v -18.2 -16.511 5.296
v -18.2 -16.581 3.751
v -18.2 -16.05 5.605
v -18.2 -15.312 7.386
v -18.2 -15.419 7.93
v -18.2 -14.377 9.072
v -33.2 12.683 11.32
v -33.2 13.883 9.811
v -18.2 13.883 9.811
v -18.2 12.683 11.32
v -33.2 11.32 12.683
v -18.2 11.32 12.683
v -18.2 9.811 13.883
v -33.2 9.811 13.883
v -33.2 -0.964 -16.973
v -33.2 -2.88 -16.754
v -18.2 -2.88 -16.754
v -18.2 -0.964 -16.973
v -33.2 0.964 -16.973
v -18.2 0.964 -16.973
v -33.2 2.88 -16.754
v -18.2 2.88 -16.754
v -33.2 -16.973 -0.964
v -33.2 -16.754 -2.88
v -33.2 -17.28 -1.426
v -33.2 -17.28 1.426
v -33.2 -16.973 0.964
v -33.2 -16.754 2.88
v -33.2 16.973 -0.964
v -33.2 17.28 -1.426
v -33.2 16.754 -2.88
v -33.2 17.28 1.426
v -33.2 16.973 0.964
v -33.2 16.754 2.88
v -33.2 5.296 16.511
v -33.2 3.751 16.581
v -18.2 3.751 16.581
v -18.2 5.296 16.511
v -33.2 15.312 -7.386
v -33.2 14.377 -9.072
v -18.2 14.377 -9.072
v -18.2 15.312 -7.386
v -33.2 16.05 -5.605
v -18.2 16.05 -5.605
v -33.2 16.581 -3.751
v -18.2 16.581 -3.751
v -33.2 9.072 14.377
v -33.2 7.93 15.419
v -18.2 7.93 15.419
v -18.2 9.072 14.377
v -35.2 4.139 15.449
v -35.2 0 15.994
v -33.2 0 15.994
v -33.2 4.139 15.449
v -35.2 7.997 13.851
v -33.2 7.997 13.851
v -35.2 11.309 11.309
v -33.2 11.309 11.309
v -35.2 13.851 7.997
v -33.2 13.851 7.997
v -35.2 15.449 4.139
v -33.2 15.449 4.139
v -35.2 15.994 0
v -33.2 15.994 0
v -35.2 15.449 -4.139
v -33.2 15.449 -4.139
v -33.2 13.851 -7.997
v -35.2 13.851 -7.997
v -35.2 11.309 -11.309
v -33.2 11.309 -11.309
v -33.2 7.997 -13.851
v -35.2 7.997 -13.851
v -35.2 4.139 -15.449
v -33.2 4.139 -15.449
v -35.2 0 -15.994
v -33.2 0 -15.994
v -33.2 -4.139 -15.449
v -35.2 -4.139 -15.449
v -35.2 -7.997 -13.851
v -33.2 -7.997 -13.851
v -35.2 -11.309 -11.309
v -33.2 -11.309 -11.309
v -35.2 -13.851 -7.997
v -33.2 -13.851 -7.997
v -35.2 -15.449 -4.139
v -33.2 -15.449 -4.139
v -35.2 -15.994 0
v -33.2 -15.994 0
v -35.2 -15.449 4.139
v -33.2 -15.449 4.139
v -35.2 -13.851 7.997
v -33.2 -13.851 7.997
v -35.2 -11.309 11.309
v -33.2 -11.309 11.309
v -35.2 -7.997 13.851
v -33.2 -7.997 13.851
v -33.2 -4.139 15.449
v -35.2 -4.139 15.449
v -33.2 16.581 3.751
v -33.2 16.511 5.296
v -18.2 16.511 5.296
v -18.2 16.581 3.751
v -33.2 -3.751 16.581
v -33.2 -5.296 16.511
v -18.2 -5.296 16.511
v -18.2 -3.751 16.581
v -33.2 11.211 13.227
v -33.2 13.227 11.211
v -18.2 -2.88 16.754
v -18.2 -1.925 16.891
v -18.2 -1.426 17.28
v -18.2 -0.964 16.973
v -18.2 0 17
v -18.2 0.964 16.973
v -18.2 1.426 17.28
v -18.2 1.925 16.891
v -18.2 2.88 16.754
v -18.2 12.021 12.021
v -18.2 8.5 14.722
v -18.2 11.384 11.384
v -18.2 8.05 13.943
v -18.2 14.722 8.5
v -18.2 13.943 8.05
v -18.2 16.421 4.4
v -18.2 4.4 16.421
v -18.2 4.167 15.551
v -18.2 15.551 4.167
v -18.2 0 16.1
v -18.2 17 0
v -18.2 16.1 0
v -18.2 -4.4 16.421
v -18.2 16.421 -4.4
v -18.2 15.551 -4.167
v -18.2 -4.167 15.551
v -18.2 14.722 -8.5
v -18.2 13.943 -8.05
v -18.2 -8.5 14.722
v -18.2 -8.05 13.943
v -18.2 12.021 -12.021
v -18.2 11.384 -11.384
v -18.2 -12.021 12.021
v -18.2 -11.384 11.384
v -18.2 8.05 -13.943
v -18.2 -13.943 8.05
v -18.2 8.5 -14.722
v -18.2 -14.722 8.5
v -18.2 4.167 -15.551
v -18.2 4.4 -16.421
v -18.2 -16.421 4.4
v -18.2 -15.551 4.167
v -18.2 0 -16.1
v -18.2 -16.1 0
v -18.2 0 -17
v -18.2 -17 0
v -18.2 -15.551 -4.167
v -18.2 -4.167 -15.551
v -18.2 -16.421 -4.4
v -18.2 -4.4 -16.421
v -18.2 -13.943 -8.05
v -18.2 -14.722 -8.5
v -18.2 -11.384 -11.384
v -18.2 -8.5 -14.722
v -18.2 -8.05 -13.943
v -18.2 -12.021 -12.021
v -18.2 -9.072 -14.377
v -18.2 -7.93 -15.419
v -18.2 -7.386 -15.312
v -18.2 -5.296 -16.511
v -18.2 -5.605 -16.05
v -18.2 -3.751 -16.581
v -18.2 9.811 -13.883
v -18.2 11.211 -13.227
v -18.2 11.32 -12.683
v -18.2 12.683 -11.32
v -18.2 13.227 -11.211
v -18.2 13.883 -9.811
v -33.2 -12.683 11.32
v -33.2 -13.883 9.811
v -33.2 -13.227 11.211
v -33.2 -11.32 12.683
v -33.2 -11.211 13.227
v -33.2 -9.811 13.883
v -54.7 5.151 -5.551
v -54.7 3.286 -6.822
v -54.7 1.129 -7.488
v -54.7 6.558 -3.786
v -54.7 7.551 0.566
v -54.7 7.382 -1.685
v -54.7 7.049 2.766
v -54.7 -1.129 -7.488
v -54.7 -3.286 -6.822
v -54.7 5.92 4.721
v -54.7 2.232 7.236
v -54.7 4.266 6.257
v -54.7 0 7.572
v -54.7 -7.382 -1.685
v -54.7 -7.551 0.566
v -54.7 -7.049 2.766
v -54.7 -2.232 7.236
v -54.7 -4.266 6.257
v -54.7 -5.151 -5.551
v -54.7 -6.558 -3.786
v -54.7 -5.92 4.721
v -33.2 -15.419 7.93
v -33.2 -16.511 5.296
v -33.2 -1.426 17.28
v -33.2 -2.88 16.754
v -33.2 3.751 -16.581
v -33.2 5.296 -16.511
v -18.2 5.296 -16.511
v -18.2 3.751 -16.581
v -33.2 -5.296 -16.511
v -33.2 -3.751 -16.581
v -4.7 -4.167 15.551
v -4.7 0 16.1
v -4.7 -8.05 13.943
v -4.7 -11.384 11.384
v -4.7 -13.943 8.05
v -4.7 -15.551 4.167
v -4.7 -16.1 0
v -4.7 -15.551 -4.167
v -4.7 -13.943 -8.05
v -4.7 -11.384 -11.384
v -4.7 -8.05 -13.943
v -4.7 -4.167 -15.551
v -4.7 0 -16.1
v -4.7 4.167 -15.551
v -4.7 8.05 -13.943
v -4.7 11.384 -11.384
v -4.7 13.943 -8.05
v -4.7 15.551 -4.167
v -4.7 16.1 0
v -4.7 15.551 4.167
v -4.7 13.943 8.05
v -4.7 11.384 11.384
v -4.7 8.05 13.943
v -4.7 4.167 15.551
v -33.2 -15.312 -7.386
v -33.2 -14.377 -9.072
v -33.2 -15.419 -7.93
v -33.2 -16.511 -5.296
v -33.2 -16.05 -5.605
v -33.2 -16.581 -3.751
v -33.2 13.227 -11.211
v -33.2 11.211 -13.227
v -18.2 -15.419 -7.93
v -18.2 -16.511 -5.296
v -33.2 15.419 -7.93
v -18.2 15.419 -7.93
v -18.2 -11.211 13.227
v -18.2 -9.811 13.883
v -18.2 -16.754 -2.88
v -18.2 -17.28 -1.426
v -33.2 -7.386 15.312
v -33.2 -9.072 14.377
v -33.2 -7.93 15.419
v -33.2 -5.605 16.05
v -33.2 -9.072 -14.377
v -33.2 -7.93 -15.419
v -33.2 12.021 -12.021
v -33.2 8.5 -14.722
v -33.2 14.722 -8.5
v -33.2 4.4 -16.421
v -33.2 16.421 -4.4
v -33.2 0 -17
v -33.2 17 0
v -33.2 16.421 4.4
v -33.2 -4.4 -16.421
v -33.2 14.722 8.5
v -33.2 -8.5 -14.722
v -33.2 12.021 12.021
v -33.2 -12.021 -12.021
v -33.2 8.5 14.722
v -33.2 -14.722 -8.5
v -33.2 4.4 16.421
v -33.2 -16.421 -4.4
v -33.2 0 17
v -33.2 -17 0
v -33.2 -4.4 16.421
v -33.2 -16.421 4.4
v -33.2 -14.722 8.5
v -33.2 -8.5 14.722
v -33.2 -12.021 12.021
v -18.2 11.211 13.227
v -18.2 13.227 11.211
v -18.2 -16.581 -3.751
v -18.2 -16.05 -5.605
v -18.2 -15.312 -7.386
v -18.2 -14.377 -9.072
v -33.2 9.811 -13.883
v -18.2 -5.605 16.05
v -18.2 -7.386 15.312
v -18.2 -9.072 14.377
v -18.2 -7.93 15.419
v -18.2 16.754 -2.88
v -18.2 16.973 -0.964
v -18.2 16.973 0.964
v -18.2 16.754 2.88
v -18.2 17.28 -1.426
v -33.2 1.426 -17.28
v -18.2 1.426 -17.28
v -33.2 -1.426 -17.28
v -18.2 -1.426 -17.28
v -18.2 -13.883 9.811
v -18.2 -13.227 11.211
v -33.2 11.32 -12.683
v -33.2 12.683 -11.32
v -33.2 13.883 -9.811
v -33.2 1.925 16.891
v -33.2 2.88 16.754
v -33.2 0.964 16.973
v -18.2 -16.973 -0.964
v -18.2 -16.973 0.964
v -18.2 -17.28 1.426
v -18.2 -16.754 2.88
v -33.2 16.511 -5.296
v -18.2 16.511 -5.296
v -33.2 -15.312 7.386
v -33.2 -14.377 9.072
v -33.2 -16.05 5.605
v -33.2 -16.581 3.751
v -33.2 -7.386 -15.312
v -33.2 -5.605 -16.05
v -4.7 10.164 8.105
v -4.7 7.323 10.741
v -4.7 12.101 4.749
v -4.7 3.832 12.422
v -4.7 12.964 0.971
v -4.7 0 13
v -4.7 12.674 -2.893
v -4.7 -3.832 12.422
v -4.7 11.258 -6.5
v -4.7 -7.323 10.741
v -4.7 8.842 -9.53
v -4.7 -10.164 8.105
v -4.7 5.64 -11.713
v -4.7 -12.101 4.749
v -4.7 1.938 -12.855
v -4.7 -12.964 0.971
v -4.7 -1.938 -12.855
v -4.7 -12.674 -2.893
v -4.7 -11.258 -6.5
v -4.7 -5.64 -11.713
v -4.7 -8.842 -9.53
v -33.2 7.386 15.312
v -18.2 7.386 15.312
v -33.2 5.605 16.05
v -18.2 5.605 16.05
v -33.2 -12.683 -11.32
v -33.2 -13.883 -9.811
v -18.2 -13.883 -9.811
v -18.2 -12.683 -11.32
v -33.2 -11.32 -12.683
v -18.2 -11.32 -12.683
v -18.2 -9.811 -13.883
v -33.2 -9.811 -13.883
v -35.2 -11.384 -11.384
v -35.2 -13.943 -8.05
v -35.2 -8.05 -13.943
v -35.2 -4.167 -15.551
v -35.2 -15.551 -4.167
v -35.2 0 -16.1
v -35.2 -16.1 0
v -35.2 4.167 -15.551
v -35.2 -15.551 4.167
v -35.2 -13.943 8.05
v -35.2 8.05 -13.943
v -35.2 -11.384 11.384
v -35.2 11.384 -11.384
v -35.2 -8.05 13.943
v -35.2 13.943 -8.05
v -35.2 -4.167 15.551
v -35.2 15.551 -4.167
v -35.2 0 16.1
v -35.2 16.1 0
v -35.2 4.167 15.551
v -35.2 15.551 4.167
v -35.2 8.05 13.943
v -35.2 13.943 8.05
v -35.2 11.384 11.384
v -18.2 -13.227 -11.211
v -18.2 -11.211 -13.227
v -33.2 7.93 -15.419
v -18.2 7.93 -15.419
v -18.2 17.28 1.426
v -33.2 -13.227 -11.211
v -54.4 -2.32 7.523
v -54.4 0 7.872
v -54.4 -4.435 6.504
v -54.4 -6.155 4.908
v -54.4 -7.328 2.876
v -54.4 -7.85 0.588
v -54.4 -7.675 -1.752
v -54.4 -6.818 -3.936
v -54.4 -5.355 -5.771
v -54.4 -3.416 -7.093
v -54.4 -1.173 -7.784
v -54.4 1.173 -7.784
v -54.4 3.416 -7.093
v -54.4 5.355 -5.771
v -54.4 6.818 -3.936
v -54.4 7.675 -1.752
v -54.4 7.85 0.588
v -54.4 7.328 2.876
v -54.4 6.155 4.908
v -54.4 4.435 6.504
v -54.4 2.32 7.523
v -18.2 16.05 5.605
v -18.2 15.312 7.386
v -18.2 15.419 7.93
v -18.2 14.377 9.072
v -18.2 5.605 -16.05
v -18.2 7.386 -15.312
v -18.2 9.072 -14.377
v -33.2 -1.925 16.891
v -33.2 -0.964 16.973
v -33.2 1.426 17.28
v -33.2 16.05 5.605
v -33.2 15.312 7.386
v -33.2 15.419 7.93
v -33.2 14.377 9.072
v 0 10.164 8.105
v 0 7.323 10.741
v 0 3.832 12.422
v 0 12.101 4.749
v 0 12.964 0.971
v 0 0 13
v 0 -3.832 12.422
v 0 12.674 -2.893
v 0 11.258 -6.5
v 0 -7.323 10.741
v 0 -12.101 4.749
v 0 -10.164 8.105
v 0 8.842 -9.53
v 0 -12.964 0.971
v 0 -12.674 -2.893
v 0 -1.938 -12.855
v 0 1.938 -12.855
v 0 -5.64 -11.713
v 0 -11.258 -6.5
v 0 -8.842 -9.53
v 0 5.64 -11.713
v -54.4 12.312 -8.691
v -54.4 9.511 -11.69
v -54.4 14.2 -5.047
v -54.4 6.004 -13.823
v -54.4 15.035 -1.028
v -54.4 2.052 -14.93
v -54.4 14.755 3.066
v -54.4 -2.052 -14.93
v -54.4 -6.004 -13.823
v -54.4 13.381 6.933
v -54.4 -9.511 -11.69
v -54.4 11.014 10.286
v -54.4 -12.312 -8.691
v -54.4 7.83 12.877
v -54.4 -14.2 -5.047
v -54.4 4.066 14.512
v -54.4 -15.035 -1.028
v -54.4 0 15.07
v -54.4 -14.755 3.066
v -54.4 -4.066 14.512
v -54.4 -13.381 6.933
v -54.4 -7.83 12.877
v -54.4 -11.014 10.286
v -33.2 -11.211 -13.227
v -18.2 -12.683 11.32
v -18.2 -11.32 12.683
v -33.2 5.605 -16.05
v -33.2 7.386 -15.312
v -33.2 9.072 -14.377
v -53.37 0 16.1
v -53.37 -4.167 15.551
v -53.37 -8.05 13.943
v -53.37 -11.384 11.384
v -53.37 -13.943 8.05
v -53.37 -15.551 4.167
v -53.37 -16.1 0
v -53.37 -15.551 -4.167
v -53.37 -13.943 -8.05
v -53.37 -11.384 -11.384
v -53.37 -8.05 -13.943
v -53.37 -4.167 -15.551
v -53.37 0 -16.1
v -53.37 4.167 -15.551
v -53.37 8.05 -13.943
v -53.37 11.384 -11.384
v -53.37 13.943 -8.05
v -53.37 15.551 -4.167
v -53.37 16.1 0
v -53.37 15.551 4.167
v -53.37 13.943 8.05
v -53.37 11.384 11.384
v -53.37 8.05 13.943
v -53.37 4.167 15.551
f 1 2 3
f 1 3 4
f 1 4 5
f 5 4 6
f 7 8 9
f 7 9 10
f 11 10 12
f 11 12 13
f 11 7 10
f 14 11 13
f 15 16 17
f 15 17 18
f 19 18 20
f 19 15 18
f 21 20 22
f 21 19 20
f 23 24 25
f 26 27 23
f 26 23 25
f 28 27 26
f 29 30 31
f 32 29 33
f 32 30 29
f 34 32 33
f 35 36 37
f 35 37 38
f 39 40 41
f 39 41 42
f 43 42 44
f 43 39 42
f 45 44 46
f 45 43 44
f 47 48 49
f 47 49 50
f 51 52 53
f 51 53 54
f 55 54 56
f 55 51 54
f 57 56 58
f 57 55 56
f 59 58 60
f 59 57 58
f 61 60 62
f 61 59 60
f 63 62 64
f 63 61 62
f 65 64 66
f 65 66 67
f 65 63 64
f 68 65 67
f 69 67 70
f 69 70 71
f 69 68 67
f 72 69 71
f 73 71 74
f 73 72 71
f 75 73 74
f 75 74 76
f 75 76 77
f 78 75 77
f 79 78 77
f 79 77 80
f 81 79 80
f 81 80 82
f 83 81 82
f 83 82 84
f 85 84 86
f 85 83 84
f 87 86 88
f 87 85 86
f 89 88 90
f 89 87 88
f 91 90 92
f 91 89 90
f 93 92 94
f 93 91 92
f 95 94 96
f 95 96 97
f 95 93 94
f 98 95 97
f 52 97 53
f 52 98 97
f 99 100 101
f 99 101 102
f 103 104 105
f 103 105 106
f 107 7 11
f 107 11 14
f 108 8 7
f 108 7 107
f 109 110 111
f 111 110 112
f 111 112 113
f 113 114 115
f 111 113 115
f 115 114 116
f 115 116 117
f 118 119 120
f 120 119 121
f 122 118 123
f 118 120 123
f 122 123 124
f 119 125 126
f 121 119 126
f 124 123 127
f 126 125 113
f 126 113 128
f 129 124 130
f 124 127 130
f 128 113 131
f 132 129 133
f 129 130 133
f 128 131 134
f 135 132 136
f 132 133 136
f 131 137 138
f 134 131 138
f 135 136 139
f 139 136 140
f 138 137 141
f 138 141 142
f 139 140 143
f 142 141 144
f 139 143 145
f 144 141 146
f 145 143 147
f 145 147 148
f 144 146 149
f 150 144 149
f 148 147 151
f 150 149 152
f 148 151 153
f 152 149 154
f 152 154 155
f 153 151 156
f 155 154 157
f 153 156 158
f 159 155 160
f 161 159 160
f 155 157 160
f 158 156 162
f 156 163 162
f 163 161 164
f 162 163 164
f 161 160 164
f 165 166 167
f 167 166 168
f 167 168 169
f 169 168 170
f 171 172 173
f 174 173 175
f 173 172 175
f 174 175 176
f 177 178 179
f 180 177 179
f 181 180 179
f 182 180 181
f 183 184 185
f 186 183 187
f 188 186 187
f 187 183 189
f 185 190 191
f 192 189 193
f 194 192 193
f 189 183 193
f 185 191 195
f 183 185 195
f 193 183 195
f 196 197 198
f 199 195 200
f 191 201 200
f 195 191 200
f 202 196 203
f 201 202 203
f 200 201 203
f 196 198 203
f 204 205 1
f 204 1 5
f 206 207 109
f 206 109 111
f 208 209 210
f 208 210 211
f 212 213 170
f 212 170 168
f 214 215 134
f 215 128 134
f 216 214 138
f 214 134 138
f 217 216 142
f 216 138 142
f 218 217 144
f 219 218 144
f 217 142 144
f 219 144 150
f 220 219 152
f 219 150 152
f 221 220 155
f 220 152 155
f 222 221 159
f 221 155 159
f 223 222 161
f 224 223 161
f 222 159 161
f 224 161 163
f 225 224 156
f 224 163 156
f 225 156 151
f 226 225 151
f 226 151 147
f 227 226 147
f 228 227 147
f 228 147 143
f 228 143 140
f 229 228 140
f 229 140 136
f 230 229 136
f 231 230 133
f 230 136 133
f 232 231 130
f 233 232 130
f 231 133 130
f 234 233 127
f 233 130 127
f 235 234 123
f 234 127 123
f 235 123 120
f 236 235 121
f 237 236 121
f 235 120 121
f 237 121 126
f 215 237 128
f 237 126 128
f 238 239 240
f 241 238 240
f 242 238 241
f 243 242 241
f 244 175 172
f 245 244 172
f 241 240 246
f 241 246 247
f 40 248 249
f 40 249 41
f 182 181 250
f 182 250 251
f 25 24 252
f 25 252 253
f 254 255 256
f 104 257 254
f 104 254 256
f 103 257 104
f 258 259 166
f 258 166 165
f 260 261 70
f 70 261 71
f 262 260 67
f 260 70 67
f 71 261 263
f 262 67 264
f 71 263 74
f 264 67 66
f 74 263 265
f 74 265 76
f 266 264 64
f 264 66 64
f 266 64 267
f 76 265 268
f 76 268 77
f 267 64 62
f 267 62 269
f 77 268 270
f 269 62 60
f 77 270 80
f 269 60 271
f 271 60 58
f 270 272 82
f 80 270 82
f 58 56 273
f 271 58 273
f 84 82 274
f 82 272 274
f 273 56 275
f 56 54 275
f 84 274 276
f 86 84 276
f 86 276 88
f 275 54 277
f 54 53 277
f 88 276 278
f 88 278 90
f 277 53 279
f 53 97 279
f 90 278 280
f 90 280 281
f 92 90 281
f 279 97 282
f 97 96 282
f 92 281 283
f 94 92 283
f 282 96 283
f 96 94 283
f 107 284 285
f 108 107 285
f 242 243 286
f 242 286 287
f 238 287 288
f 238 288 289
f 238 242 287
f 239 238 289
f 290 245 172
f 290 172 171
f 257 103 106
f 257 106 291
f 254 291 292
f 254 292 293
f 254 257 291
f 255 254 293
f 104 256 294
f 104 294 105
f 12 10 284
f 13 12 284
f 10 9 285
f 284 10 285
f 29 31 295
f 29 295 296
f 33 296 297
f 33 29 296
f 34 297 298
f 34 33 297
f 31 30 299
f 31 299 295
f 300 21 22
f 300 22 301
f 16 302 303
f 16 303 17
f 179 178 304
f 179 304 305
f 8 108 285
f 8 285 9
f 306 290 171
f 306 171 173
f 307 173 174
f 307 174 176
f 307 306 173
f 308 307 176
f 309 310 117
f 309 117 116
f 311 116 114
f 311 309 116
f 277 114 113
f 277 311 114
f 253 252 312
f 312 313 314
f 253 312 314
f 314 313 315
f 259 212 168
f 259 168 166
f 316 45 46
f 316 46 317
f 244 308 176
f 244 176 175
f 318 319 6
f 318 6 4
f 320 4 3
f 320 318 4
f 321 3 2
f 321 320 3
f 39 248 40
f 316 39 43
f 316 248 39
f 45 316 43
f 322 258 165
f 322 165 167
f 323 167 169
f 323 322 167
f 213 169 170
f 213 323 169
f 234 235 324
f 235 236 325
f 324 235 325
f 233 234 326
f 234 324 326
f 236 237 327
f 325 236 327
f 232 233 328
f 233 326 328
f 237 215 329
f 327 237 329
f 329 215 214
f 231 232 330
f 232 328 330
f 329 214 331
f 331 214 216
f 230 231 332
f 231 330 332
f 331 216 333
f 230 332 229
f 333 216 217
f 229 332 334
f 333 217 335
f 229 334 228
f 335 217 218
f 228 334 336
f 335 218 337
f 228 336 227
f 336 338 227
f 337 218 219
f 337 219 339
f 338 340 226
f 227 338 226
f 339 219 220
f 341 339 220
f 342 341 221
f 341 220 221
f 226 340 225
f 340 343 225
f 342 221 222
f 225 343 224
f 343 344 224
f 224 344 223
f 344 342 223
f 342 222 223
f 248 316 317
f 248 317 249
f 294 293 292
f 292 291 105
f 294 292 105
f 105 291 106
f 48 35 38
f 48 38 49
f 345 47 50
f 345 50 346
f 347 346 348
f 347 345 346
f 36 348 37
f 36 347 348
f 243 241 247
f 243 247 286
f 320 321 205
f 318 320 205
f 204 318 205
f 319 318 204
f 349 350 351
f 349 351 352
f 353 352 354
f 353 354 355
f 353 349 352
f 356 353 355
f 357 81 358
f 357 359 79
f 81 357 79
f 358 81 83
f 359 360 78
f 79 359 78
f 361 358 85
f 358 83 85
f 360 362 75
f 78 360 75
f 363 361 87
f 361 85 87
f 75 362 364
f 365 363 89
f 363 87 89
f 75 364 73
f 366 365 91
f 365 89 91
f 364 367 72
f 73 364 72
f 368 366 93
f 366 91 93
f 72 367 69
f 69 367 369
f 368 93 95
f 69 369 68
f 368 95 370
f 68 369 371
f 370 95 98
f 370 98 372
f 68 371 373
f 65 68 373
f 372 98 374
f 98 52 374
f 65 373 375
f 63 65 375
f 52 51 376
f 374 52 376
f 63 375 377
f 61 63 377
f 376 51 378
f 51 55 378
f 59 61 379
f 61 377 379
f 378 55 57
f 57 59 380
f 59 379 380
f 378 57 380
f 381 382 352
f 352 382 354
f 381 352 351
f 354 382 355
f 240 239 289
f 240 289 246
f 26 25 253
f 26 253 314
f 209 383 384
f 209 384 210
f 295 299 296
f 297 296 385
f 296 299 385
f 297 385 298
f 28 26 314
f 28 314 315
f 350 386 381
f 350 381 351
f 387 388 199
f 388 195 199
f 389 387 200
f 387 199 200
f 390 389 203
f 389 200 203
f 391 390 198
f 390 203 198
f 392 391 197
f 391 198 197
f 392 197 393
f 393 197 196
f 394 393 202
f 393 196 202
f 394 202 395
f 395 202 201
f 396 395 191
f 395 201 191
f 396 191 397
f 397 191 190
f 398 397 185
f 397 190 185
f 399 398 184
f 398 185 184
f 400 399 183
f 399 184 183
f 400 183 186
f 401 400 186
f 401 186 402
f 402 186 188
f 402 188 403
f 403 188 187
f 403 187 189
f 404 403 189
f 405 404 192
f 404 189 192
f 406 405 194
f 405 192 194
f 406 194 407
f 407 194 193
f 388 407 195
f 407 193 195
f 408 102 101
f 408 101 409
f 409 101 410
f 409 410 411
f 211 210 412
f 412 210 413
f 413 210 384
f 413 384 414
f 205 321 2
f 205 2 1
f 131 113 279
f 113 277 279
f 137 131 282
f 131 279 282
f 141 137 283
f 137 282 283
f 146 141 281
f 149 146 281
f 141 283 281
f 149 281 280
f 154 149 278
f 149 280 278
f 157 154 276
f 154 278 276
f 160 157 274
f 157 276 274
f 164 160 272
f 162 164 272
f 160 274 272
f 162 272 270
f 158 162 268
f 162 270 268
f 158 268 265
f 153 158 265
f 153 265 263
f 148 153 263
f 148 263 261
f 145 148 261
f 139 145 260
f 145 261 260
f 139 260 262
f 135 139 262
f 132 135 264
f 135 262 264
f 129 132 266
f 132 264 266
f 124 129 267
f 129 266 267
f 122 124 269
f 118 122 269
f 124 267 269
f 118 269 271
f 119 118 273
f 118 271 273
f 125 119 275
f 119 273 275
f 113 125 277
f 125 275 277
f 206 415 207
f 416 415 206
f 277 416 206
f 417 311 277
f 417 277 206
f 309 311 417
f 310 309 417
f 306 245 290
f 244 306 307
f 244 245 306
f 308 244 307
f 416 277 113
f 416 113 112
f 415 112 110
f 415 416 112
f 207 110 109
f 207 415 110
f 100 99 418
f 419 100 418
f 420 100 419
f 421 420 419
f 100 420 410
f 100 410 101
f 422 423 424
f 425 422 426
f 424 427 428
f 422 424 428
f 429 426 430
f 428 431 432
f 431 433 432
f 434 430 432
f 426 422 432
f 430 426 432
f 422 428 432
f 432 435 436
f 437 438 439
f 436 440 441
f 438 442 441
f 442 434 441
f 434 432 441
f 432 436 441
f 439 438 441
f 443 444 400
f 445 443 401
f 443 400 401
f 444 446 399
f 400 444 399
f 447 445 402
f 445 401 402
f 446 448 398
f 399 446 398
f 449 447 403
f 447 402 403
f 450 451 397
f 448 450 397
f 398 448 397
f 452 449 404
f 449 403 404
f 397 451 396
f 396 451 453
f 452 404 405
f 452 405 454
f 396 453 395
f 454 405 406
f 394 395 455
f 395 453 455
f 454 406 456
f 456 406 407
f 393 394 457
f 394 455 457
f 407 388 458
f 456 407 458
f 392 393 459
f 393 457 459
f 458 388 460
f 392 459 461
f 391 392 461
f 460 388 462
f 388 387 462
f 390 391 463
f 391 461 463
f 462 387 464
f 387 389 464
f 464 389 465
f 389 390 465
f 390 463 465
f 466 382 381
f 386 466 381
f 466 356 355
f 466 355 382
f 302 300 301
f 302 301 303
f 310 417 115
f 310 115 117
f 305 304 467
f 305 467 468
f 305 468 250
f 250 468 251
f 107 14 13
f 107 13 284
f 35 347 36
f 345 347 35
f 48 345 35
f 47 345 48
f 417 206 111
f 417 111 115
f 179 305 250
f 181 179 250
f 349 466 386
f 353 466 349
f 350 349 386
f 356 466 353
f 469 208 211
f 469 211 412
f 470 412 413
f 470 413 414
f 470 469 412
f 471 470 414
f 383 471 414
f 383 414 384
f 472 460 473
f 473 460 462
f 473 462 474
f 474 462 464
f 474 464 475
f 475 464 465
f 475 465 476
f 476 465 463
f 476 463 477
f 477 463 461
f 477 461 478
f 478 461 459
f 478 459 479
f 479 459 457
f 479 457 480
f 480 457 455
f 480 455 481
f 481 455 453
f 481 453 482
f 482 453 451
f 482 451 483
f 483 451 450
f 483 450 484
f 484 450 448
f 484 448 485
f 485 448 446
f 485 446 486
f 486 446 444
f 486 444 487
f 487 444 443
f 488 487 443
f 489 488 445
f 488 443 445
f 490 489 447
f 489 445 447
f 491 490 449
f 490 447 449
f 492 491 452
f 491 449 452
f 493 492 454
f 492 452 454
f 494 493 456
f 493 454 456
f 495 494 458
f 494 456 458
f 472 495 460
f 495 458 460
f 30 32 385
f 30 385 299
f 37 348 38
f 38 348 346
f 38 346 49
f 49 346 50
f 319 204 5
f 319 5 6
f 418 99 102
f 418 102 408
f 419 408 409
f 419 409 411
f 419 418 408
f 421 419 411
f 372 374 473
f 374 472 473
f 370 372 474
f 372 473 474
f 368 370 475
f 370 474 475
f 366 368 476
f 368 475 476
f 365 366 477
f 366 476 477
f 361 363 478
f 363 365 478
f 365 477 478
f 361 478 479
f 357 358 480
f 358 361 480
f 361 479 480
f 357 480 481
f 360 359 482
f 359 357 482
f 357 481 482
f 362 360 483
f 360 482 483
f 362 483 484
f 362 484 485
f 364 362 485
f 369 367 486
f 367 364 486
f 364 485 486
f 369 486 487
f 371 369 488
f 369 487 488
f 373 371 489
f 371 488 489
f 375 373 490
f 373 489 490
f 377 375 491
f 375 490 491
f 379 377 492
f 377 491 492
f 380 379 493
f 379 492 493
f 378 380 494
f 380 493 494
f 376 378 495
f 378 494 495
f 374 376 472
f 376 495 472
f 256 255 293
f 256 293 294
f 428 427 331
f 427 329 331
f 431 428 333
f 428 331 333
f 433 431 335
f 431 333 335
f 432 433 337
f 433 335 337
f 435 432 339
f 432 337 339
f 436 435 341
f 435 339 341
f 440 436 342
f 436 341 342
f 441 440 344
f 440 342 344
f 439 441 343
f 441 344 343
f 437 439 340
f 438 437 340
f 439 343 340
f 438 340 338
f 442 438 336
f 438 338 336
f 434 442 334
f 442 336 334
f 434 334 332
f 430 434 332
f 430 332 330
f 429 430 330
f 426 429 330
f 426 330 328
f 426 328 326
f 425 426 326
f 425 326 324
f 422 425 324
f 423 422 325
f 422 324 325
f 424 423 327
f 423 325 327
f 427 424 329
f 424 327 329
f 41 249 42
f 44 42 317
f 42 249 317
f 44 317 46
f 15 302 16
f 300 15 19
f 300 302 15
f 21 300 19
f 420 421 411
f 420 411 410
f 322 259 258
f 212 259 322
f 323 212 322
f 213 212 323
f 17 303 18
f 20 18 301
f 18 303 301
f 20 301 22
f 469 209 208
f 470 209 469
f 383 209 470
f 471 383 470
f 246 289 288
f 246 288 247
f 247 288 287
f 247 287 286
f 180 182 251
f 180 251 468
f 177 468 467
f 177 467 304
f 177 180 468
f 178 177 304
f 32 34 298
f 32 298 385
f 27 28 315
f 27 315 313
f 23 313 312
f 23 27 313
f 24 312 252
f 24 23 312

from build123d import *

# Parameters (mm, degrees)
BOSS_EXTRUDE1_DEPTH    = 15
BOSS_EXTRUDE1_2_DEPTH  = 15
BOSS_EXTRUDE1_3_DEPTH  = 15
BOSS_EXTRUDE1_4_DEPTH  = 15
BOSS_EXTRUDE1_5_DEPTH  = 15
BOSS_EXTRUDE1_6_DEPTH  = 15
BOSS_EXTRUDE1_7_DEPTH  = 15
BOSS_EXTRUDE1_8_DEPTH  = 15
BOSS_EXTRUDE1_9_DEPTH  = 15
BOSS_EXTRUDE1_10_DEPTH = 15
BOSS_EXTRUDE1_11_DEPTH = 15
BOSS_EXTRUDE1_12_DEPTH = 15
BOSS_EXTRUDE1_13_DEPTH = 15
BOSS_EXTRUDE1_14_DEPTH = 15
BOSS_EXTRUDE1_15_DEPTH = 15
BOSS_EXTRUDE1_16_DEPTH = 15
CUT_EXTRUDE1_START     = 2
SKETCH3_R              = 16.1
SKETCH3_R_2            = 15.993618491
CUT_EXTRUDE1_DEPTH     = 2


with BuildPart() as part:
    # Sketch1 → Revolve1 (revolve)
    with BuildSketch(Plane.XY, mode=Mode.PRIVATE) as revolve1_sk:
        Polygon((0, 0), (0, 13), (-4.7, 13), (-4.7, 16.1), (-18.2, 16.1), (-18.2, 17), (-33.2, 17), (-33.2, 16.1), (-53.370470841, 16.1), (-54.399998096, 15.070472746), (-54.399998096, 7.872343539), (-54.7, 7.572341635), (-54.7, 0), align=None)
    revolve(revolve1_sk.sketch.rotate(Axis((-54.7, 0, 0), (1, 0, 0)), 90), axis=Axis((-54.7, 0, 0), (1, 0, 0)))

    # Sketch3 → Cut-Extrude1 (cut)
    with BuildSketch(Plane.ZY.offset(33.2).offset(CUT_EXTRUDE1_START)):
        Circle(SKETCH3_R)
        Circle(SKETCH3_R_2, mode=Mode.SUBTRACT)
    extrude(amount=-CUT_EXTRUDE1_DEPTH, mode=Mode.SUBTRACT)


with BuildPart() as body_2:
    # Sketch2 → Boss-Extrude1 (new body)
    with BuildSketch(Plane.ZY.offset(33.2)):
        with BuildLine():
            Line((17.280365855, 1.425744986), (16.754324522, 2.879689187))
            ThreePointArc((16.754324522, 2.879689187), (16.938469778, 1.445074933), (17, 0))
            ThreePointArc((17, 0), (16.938469778, -1.445074933), (16.754324522, -2.879689187))
            Line((16.754324522, -2.879689187), (17.280365855, -1.425744986))
            Line((17.280365855, -1.425744986), (17.280365855, 1.425744986))
        make_face()
    extrude(amount=-BOSS_EXTRUDE1_DEPTH)


with BuildPart() as body_3:
    # Sketch2 → Boss-Extrude1 2 (new body)
    with BuildSketch(Plane.ZY.offset(33.2)):
        with BuildLine():
            Line((16.510585312, -5.295693106), (16.580986849, -3.751116515))
            ThreePointArc((16.580986849, -3.751116515), (15.705952053, -6.50561835), (14.376968165, -9.072088315))
            Line((14.376968165, -9.072088315), (15.419367342, -7.930126329))
            Line((15.419367342, -7.930126329), (16.510585312, -5.295693106))
        make_face()
    extrude(amount=-BOSS_EXTRUDE1_2_DEPTH)


with BuildPart() as body_4:
    # Sketch2 → Boss-Extrude1 3 (new body)
    with BuildSketch(Plane.ZY.offset(33.2)):
        with BuildLine():
            Line((13.227217825, -11.210909929), (13.883344235, -9.810848732))
            ThreePointArc((13.883344235, -9.810848732), (12.02081528, -12.02081528), (9.810848732, -13.883344235))
            Line((9.810848732, -13.883344235), (11.210909929, -13.227217825))
            Line((11.210909929, -13.227217825), (13.227217825, -11.210909929))
        make_face()
    extrude(amount=-BOSS_EXTRUDE1_3_DEPTH)


with BuildPart() as body_5:
    # Sketch2 → Boss-Extrude1 4 (new body)
    with BuildSketch(Plane.ZY.offset(33.2)):
        with BuildLine():
            Line((7.930126329, -15.419367342), (9.072088315, -14.376968165))
            ThreePointArc((9.072088315, -14.376968165), (6.50561835, -15.705952053), (3.751116515, -16.580986849))
            Line((3.751116515, -16.580986849), (5.295693106, -16.510585312))
            Line((5.295693106, -16.510585312), (7.930126329, -15.419367342))
        make_face()
    extrude(amount=-BOSS_EXTRUDE1_4_DEPTH)


with BuildPart() as body_6:
    # Sketch2 → Boss-Extrude1 5 (new body)
    with BuildSketch(Plane.ZY.offset(33.2)):
        with BuildLine():
            Line((1.425744986, -17.280365855), (2.879689187, -16.754324522))
            ThreePointArc((2.879689187, -16.754324522), (0, -17), (-2.879689187, -16.754324522))
            Line((-2.879689187, -16.754324522), (-1.425744986, -17.280365855))
            Line((-1.425744986, -17.280365855), (1.425744986, -17.280365855))
        make_face()
    extrude(amount=-BOSS_EXTRUDE1_5_DEPTH)


with BuildPart() as body_7:
    # Sketch2 → Boss-Extrude1 6 (new body)
    with BuildSketch(Plane.ZY.offset(33.2)):
        with BuildLine():
            Line((-5.295693106, -16.510585312), (-3.751116515, -16.580986849))
            ThreePointArc((-3.751116515, -16.580986849), (-6.50561835, -15.705952053), (-9.072088315, -14.376968165))
            Line((-9.072088315, -14.376968165), (-7.930126329, -15.419367342))
            Line((-7.930126329, -15.419367342), (-5.295693106, -16.510585312))
        make_face()
    extrude(amount=-BOSS_EXTRUDE1_6_DEPTH)


with BuildPart() as body_8:
    # Sketch2 → Boss-Extrude1 7 (new body)
    with BuildSketch(Plane.ZY.offset(33.2)):
        with BuildLine():
            Line((-11.210909929, -13.227217825), (-9.810848732, -13.883344235))
            ThreePointArc((-9.810848732, -13.883344235), (-12.02081528, -12.02081528), (-13.883344235, -9.810848732))
            Line((-13.883344235, -9.810848732), (-13.227217825, -11.210909929))
            Line((-13.227217825, -11.210909929), (-11.210909929, -13.227217825))
        make_face()
    extrude(amount=-BOSS_EXTRUDE1_7_DEPTH)


with BuildPart() as body_9:
    # Sketch2 → Boss-Extrude1 8 (new body)
    with BuildSketch(Plane.ZY.offset(33.2)):
        with BuildLine():
            Line((-15.419367342, -7.930126329), (-14.376968165, -9.072088315))
            ThreePointArc((-14.376968165, -9.072088315), (-15.705952053, -6.50561835), (-16.580986849, -3.751116515))
            Line((-16.580986849, -3.751116515), (-16.510585312, -5.295693106))
            Line((-16.510585312, -5.295693106), (-15.419367342, -7.930126329))
        make_face()
    extrude(amount=-BOSS_EXTRUDE1_8_DEPTH)


with BuildPart() as body_10:
    # Sketch2 → Boss-Extrude1 9 (new body)
    with BuildSketch(Plane.ZY.offset(33.2)):
        with BuildLine():
            ThreePointArc((-16.754324522, -2.879689187), (-17, 0), (-16.754324522, 2.879689187))
            Line((-16.754324522, 2.879689187), (-17.280365855, 1.425744986))
            Line((-17.280365855, 1.425744986), (-17.280365855, -1.425744986))
            Line((-17.280365855, -1.425744986), (-16.754324522, -2.879689187))
        make_face()
    extrude(amount=-BOSS_EXTRUDE1_9_DEPTH)


with BuildPart() as body_11:
    # Sketch2 → Boss-Extrude1 10 (new body)
    with BuildSketch(Plane.ZY.offset(33.2)):
        with BuildLine():
            ThreePointArc((-16.580986849, 3.751116515), (-15.705952053, 6.50561835), (-14.376968165, 9.072088315))
            Line((-14.376968165, 9.072088315), (-15.419367342, 7.930126329))
            Line((-15.419367342, 7.930126329), (-16.510585312, 5.295693106))
            Line((-16.510585312, 5.295693106), (-16.580986849, 3.751116515))
        make_face()
    extrude(amount=-BOSS_EXTRUDE1_10_DEPTH)


with BuildPart() as body_12:
    # Sketch2 → Boss-Extrude1 11 (new body)
    with BuildSketch(Plane.ZY.offset(33.2)):
        with BuildLine():
            ThreePointArc((-13.883344235, 9.810848732), (-12.02081528, 12.02081528), (-9.810848732, 13.883344235))
            Line((-9.810848732, 13.883344235), (-11.210909929, 13.227217825))
            Line((-11.210909929, 13.227217825), (-13.227217825, 11.210909929))
            Line((-13.227217825, 11.210909929), (-13.883344235, 9.810848732))
        make_face()
    extrude(amount=-BOSS_EXTRUDE1_11_DEPTH)


with BuildPart() as body_13:
    # Sketch2 → Boss-Extrude1 12 (new body)
    with BuildSketch(Plane.ZY.offset(33.2)):
        with BuildLine():
            ThreePointArc((-9.072088315, 14.376968165), (-6.50561835, 15.705952053), (-3.751116515, 16.580986849))
            Line((-3.751116515, 16.580986849), (-5.295693106, 16.510585312))
            Line((-5.295693106, 16.510585312), (-7.930126329, 15.419367342))
            Line((-7.930126329, 15.419367342), (-9.072088315, 14.376968165))
        make_face()
    extrude(amount=-BOSS_EXTRUDE1_12_DEPTH)


with BuildPart() as body_14:
    # Sketch2 → Boss-Extrude1 13 (new body)
    with BuildSketch(Plane.ZY.offset(33.2)):
        with BuildLine():
            ThreePointArc((-2.879689187, 16.754324522), (0, 17), (2.879689187, 16.754324522))
            Line((2.879689187, 16.754324522), (1.425744986, 17.280365855))
            Line((1.425744986, 17.280365855), (-1.425744986, 17.280365855))
            Line((-1.425744986, 17.280365855), (-2.879689187, 16.754324522))
        make_face()
    extrude(amount=-BOSS_EXTRUDE1_13_DEPTH)


with BuildPart() as body_15:
    # Sketch2 → Boss-Extrude1 14 (new body)
    with BuildSketch(Plane.ZY.offset(33.2)):
        with BuildLine():
            ThreePointArc((3.751116515, 16.580986849), (6.50561835, 15.705952053), (9.072088315, 14.376968165))
            Line((9.072088315, 14.376968165), (7.930126329, 15.419367342))
            Line((7.930126329, 15.419367342), (5.295693106, 16.510585312))
            Line((5.295693106, 16.510585312), (3.751116515, 16.580986849))
        make_face()
    extrude(amount=-BOSS_EXTRUDE1_14_DEPTH)


with BuildPart() as body_16:
    # Sketch2 → Boss-Extrude1 15 (new body)
    with BuildSketch(Plane.ZY.offset(33.2)):
        with BuildLine():
            ThreePointArc((9.810848732, 13.883344235), (12.02081528, 12.02081528), (13.883344235, 9.810848732))
            Line((13.883344235, 9.810848732), (13.227217825, 11.210909929))
            Line((13.227217825, 11.210909929), (11.210909929, 13.227217825))
            Line((11.210909929, 13.227217825), (9.810848732, 13.883344235))
        make_face()
    extrude(amount=-BOSS_EXTRUDE1_15_DEPTH)


with BuildPart() as body_17:
    # Sketch2 → Boss-Extrude1 16 (new body)
    with BuildSketch(Plane.ZY.offset(33.2)):
        with BuildLine():
            ThreePointArc((14.376968165, 9.072088315), (15.705952053, 6.50561835), (16.580986849, 3.751116515))
            Line((16.580986849, 3.751116515), (16.510585312, 5.295693106))
            Line((16.510585312, 5.295693106), (15.419367342, 7.930126329))
            Line((15.419367342, 7.930126329), (14.376968165, 9.072088315))
        make_face()
    extrude(amount=-BOSS_EXTRUDE1_16_DEPTH)


solid = Compound([part.part, body_2.part, body_3.part, body_4.part, body_5.part, body_6.part, body_7.part, body_8.part, body_9.part, body_10.part, body_11.part, body_12.part, body_13.part, body_14.part, body_15.part, body_16.part, body_17.part])
